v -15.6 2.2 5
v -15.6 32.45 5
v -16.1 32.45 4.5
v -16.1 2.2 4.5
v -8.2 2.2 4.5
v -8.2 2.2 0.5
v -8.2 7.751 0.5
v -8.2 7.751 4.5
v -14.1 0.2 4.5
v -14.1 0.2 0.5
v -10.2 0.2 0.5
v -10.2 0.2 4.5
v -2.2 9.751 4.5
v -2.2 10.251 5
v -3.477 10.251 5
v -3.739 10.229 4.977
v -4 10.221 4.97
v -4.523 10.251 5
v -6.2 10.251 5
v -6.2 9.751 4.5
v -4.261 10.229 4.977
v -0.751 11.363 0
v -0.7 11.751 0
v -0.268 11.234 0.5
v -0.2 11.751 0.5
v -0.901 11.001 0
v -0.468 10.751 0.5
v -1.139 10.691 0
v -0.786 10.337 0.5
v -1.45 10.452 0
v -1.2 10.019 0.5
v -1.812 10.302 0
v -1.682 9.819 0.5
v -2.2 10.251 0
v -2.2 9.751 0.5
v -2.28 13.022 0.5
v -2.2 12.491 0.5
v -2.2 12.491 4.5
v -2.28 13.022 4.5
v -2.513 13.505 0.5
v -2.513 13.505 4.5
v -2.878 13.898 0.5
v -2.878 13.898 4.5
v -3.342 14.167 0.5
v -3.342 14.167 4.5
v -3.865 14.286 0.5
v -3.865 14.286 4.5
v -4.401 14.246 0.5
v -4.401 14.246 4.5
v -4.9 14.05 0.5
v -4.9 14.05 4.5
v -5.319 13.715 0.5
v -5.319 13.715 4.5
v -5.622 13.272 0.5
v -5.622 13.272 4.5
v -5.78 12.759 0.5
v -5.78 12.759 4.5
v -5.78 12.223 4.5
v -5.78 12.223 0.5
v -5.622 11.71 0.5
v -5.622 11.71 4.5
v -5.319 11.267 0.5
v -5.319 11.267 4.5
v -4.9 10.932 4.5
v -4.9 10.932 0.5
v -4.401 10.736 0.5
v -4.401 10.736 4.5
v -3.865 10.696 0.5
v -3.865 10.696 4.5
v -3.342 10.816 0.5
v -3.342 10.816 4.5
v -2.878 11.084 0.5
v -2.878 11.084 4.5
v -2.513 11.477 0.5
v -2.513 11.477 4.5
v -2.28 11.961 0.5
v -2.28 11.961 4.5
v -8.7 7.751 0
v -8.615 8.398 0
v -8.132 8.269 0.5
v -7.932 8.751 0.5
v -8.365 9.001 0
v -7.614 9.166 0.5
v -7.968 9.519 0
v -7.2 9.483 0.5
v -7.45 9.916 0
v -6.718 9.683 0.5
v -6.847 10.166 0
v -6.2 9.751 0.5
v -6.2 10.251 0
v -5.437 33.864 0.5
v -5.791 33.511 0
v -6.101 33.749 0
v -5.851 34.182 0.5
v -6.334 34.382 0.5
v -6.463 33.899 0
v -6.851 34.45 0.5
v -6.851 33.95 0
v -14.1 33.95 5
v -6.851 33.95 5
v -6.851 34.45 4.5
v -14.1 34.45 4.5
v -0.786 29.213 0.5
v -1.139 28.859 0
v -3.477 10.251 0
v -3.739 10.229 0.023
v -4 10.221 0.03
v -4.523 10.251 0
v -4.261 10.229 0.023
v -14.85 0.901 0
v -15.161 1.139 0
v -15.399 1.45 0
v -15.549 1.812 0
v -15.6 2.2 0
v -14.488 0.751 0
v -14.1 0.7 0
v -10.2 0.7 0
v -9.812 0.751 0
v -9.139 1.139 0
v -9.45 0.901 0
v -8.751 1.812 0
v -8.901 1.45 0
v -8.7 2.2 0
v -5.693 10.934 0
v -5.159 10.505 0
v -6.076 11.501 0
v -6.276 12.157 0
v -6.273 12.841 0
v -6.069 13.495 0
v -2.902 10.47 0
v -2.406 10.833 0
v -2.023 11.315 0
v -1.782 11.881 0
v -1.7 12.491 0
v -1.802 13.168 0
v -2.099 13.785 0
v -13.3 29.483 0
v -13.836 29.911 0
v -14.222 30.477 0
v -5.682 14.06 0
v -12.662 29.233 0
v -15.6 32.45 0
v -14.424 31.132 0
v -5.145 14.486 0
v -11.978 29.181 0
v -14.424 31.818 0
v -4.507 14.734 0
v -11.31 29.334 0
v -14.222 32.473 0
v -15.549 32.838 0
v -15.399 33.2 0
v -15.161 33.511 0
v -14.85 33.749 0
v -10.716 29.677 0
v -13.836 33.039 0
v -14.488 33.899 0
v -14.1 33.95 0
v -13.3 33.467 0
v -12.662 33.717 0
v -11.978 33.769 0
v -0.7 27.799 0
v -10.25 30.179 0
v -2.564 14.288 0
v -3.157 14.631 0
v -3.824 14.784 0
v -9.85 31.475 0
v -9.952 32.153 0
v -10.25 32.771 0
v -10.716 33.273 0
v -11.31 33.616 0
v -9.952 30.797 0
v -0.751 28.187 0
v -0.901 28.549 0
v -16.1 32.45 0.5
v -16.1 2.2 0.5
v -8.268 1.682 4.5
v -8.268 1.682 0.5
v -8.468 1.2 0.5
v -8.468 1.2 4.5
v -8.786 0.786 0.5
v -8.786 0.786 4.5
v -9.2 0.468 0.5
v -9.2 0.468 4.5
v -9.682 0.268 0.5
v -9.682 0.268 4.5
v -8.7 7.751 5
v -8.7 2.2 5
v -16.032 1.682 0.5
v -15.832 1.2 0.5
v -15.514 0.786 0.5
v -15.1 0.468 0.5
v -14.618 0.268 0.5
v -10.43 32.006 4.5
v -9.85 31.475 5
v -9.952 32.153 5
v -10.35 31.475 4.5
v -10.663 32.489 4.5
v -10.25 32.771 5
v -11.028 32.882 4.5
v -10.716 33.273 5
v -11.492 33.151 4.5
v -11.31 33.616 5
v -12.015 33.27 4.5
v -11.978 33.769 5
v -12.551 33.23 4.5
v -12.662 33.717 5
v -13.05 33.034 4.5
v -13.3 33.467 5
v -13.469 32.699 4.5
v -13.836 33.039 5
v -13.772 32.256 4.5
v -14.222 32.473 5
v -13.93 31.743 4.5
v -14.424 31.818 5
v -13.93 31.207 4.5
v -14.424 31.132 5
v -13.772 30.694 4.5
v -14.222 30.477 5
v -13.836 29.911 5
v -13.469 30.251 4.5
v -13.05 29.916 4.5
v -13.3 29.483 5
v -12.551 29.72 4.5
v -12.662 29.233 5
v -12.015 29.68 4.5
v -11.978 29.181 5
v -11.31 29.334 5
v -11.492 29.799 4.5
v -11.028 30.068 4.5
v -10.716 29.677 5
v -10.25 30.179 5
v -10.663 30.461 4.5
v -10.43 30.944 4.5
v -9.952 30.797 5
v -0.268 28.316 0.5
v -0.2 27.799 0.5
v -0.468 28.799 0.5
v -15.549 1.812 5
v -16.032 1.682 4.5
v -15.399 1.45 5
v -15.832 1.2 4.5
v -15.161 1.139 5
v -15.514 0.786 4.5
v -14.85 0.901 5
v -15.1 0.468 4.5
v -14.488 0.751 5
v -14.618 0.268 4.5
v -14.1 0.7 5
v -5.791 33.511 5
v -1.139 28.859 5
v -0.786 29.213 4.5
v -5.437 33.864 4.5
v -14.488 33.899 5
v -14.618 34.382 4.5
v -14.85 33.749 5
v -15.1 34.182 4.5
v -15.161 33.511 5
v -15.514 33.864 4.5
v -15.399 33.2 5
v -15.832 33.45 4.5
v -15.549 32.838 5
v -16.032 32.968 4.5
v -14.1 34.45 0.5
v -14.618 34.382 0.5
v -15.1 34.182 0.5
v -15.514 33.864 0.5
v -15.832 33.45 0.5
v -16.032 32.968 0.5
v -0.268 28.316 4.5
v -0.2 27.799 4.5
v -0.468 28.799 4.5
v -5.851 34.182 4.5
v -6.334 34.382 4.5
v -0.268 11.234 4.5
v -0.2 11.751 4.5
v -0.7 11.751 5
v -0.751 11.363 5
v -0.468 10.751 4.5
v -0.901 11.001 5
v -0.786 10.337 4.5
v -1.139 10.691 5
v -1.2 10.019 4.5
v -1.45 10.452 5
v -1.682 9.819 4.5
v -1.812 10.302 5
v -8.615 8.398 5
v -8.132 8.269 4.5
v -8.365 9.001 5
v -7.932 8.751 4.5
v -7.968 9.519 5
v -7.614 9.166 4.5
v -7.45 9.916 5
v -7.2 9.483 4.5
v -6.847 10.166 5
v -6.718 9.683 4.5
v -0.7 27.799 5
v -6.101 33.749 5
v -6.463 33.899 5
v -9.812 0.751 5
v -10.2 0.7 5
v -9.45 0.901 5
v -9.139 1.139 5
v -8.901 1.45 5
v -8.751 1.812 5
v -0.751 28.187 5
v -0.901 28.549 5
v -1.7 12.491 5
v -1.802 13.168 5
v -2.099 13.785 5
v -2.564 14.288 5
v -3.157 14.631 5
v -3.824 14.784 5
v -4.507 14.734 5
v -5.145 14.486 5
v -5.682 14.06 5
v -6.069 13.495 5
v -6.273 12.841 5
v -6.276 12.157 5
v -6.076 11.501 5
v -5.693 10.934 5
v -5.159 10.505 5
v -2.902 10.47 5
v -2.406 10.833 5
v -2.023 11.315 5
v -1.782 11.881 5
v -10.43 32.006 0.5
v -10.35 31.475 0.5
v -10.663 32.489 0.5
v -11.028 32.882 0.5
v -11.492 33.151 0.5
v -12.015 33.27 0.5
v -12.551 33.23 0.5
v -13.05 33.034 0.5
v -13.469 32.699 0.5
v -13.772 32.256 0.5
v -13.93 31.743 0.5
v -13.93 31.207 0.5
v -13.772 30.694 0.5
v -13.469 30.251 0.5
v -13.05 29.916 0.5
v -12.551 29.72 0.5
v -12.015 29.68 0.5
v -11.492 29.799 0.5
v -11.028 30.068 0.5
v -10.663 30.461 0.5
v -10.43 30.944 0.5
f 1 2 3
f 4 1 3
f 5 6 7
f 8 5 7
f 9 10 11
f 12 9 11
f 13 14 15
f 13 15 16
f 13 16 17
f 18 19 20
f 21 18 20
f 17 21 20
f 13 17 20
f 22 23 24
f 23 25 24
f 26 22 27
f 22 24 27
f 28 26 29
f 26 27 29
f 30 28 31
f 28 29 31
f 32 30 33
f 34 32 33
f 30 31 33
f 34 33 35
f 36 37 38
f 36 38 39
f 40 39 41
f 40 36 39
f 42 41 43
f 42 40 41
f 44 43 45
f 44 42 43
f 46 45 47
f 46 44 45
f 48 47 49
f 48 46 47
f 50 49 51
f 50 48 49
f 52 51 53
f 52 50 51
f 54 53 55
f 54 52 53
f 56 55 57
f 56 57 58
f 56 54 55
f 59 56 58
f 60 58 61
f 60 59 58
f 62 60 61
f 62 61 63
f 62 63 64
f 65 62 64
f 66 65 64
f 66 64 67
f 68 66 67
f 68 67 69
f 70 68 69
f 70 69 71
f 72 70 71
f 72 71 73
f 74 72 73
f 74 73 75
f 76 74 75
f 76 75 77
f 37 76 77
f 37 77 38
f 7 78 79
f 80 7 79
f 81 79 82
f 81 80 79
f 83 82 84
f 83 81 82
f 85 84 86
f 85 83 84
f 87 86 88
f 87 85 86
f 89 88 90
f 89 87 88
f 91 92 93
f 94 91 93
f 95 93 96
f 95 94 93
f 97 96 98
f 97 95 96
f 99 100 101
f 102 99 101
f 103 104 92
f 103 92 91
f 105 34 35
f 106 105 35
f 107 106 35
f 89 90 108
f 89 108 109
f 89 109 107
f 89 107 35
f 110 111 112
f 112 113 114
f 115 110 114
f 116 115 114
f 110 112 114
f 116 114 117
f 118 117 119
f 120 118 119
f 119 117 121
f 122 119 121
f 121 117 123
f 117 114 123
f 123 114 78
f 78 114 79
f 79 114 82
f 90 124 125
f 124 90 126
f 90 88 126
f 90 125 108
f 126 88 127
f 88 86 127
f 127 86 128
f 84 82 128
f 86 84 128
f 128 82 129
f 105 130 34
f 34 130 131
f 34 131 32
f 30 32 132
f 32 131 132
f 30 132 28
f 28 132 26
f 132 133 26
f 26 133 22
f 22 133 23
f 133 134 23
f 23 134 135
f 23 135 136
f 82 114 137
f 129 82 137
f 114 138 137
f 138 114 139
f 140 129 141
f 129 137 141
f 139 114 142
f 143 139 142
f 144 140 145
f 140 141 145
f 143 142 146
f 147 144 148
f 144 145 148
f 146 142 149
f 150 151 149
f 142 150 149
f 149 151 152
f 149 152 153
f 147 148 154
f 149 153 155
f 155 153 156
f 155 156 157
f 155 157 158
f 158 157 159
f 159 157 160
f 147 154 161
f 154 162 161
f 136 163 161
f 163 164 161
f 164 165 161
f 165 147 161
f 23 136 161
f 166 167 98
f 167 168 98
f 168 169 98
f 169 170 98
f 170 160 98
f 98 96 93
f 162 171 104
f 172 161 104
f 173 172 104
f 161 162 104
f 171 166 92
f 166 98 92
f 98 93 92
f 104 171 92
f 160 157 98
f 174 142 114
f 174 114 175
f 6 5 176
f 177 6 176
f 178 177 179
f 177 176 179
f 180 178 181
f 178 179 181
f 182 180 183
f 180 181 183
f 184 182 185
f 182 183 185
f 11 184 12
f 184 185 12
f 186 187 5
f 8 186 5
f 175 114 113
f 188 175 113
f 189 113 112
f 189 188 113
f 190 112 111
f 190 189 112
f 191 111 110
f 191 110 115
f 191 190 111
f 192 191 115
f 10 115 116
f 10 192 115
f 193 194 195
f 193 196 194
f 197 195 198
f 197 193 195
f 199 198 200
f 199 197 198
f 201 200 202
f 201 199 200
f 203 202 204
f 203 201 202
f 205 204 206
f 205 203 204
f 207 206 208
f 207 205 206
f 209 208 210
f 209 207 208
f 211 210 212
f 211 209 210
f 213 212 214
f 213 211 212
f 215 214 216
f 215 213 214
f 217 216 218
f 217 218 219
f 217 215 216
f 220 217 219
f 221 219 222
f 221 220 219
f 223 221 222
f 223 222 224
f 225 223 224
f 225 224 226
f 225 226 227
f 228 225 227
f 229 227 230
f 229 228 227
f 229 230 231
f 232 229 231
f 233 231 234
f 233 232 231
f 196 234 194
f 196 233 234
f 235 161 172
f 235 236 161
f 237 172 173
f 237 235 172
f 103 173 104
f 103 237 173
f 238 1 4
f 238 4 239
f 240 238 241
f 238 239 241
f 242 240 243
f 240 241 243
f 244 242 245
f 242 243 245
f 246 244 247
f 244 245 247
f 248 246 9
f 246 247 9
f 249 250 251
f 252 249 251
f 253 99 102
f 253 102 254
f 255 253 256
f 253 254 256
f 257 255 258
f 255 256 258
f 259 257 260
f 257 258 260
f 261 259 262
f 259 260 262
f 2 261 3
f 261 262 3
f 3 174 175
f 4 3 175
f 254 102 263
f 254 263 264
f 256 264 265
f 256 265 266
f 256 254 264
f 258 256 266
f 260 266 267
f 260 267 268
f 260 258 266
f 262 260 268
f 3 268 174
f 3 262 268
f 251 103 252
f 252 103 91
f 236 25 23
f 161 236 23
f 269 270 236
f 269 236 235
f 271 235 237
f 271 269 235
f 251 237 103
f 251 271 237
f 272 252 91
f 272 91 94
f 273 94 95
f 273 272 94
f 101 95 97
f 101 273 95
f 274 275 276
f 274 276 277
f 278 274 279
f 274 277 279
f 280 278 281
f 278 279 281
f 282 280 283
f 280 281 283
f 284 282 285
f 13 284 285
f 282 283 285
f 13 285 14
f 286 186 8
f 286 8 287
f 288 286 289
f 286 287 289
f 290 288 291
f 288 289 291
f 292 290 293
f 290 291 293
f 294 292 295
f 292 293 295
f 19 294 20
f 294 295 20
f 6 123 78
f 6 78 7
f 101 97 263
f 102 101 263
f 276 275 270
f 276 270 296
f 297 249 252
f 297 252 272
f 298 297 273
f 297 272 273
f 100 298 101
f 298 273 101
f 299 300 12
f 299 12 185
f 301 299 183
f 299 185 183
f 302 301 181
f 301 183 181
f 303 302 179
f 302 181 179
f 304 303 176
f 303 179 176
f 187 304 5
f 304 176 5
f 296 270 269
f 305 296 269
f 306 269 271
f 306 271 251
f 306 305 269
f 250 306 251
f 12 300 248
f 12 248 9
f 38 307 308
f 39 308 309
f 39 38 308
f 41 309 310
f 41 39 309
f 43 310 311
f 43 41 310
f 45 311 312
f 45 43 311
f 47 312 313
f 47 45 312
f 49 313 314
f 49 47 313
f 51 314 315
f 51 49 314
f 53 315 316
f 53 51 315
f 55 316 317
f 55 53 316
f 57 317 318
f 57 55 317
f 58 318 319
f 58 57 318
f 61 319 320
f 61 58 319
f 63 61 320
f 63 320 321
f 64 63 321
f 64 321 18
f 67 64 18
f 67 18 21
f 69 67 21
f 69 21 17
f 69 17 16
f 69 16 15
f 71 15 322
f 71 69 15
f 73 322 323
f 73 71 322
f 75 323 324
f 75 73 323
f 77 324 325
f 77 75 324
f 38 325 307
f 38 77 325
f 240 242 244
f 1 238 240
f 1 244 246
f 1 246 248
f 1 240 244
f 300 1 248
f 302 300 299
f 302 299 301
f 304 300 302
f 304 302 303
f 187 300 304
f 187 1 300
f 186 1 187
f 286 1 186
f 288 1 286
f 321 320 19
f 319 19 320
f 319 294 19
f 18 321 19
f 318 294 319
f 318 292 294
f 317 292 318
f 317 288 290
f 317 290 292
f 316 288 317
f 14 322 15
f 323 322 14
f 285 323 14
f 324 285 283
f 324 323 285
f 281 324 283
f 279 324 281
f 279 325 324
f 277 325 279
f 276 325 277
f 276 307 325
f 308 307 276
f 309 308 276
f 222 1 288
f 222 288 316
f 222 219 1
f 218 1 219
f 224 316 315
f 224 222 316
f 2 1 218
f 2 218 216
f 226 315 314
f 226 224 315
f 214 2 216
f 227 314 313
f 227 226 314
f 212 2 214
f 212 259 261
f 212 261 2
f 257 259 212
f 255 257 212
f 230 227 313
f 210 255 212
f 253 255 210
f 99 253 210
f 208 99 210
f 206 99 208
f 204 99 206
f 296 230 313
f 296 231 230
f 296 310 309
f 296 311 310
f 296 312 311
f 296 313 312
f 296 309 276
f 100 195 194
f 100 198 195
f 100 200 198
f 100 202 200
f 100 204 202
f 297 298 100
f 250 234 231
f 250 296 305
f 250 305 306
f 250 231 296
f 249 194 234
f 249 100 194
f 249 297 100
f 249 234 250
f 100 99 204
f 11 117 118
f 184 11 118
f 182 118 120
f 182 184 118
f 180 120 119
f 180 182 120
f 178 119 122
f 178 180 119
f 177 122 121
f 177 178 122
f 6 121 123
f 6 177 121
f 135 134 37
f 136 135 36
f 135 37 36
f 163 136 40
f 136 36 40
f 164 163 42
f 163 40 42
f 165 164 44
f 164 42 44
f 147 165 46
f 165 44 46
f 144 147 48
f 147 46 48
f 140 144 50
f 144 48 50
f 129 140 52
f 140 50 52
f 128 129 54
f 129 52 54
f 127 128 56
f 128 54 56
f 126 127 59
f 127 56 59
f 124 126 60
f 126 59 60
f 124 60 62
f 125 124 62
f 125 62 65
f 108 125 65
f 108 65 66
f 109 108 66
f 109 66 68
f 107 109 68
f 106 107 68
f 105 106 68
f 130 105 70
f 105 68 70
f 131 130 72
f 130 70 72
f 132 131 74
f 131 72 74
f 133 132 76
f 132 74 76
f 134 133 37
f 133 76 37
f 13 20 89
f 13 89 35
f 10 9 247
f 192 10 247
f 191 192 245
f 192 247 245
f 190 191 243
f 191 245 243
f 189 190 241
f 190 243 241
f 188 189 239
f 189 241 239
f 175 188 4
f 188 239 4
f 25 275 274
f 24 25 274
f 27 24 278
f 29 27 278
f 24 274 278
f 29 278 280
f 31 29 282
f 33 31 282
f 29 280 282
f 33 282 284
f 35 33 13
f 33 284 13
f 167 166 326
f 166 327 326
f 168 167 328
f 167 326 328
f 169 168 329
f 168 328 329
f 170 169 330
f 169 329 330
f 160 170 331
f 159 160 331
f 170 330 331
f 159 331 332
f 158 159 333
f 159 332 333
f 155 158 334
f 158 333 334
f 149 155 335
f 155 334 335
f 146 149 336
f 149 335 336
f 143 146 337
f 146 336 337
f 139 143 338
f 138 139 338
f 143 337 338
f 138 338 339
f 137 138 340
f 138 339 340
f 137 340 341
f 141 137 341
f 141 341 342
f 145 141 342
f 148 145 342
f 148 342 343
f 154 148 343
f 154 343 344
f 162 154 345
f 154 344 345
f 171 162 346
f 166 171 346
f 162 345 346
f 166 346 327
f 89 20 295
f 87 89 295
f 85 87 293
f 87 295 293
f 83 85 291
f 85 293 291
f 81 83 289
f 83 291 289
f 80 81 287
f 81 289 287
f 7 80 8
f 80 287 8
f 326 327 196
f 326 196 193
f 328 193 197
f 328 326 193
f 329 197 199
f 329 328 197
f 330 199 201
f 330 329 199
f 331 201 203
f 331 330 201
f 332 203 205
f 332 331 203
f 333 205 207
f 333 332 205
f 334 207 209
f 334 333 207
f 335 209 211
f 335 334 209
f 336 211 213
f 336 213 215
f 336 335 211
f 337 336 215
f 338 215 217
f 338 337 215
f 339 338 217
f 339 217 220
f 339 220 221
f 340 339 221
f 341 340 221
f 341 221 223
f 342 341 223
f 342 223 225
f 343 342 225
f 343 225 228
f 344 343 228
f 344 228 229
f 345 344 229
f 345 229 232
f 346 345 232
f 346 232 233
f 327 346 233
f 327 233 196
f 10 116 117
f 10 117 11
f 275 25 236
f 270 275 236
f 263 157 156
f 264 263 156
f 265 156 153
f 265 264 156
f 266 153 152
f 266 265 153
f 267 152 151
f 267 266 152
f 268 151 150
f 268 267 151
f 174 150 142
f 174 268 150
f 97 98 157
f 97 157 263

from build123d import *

# Parameters (mm, degrees)
SKIZZE1_R                       = 1.8
AUFSATZ_LINEAR_AUSTRAGEN1_DEPTH = 5
VERRUNDUNG1_R                   = 2
FASE1_SIZE                      = 0.5


with BuildPart() as part:
    # Skizze1 → Aufsatz-Linear austragen1 (new body)
    with BuildSketch(Plane.XY):
        Polygon((-0.2, 9.751346921), (-0.2, 28.627239348), (-6.022760652, 34.45), (-16.1, 34.45), (-16.1, 0.2), (-8.2, 0.2), (-8.2, 9.751346921), align=None)
        with Locations((-12.15, 31.475)):
            Circle(SKIZZE1_R, mode=Mode.SUBTRACT)
        with Locations((-4, 12.49111782)):
            Circle(SKIZZE1_R, mode=Mode.SUBTRACT)
    extrude(amount=AUFSATZ_LINEAR_AUSTRAGEN1_DEPTH)

    # Verrundung1
    verrundung1_edges = [part.edges().sort_by_distance(p)[0] for p in [
        (-8.2, 9.751346921, 2.5),
        (-8.2, 0.2, 2.5),
        (-16.1, 0.2, 2.5),
        (-16.1, 34.45, 2.5),
        (-6.022760652, 34.45, 2.5),
        (-0.2, 28.627239348, 2.5),
        (-0.2, 9.751346921, 2.5),
    ]]
    fillet(verrundung1_edges, radius=VERRUNDUNG1_R)

    # Fase1
    # the kernel refuses this chamfer: 0.5 mm, written as the material it takes off along each edge
    with BuildSketch(Plane(origin=(-12.15, 31.475, 0), x_dir=(1, 0, 0), z_dir=(0, -1, 0))) as fase1_piece_1:
        Polygon((1.8 + FASE1_SIZE, 0), (1.8, FASE1_SIZE), (1.8, 0), align=None)
    revolve(axis=Axis((-12.15, 31.475, 0), (0, 0, 1)), mode=Mode.SUBTRACT)
    with BuildSketch(Plane(origin=(-12.15, 31.475, 5), x_dir=(1, 0, 0), z_dir=(0, -1, 0))) as fase1_piece_2:
        Polygon((1.8 + FASE1_SIZE, 0), (1.8, -FASE1_SIZE), (1.8, 0), align=None)
    revolve(axis=Axis((-12.15, 31.475, 5), (0, 0, 1)), mode=Mode.SUBTRACT)
    with BuildSketch(Plane(origin=(-4, 12.49111782, 0), x_dir=(1, 0, 0), z_dir=(0, -1, 0))) as fase1_piece_3:
        Polygon((1.8 + FASE1_SIZE, 0), (1.8, FASE1_SIZE), (1.8, 0), align=None)
    revolve(axis=Axis((-4, 12.49111782, 0), (0, 0, 1)), mode=Mode.SUBTRACT)
    with BuildSketch(Plane(origin=(-4, 12.49111782, 5), x_dir=(1, 0, 0), z_dir=(0, -1, 0))) as fase1_piece_4:
        Polygon((1.8 + FASE1_SIZE, 0), (1.8, -FASE1_SIZE), (1.8, 0), align=None)
    revolve(axis=Axis((-4, 12.49111782, 5), (0, 0, 1)), mode=Mode.SUBTRACT)
    with BuildSketch(Plane(origin=(-0.2, 11.751346921, 0), x_dir=(0.027495876610586382, 0, 0.9996219169112968), z_dir=(0, 1, 0))) as fase1_piece_5:
        Polygon((FASE1_SIZE * 0.999621916911, -FASE1_SIZE * 0.0274958766106), (-FASE1_SIZE * 0.0274958766106, -FASE1_SIZE * 0.999621916911), (0, 0), align=None)
    extrude(amount=16.047465302, mode=Mode.SUBTRACT)
    with BuildSketch(Plane(origin=(-0.2, 11.751346921, 5), x_dir=(0.027495876610586403, 0, -0.9996219169112968), z_dir=(0, 1, 0))) as fase1_piece_6:
        Polygon((FASE1_SIZE * 0.999621916911, FASE1_SIZE * 0.0274958766106), (-FASE1_SIZE * 0.0274958766106, FASE1_SIZE * 0.999621916911), (0, 0), align=None)
    extrude(amount=16.047465302, mode=Mode.SUBTRACT)
    with BuildSketch(Plane(origin=(-6.2, 9.751346921, 0), x_dir=(0, 0.9996219169112968, -0.02749587661058639), z_dir=(1, 0, 0))) as fase1_piece_7:
        Polygon((FASE1_SIZE * 0.999621916911, FASE1_SIZE * 0.0274958766106), (-FASE1_SIZE * 0.0274958766106, FASE1_SIZE * 0.999621916911), (0, 0), align=None)
    extrude(amount=4, mode=Mode.SUBTRACT)
    with BuildSketch(Plane(origin=(-8.2, 2.2, 0), x_dir=(-0.9996219169112968, 0, -0.02749587661058639), z_dir=(0, 1, 0))) as fase1_piece_8:
        Polygon((FASE1_SIZE * 0.999621916911, FASE1_SIZE * 0.0274958766106), (-FASE1_SIZE * 0.0274958766106, FASE1_SIZE * 0.999621916911), (0, 0), align=None)
    extrude(amount=5.551346921, mode=Mode.SUBTRACT)
    with BuildSketch(Plane(origin=(-14.1, 0.2, 0), x_dir=(0, 0.9996219169112968, -0.027495876610586372), z_dir=(1, 0, 0))) as fase1_piece_9:
        Polygon((FASE1_SIZE * 0.999621916911, FASE1_SIZE * 0.0274958766106), (-FASE1_SIZE * 0.0274958766106, FASE1_SIZE * 0.999621916911), (0, 0), align=None)
    extrude(amount=3.9, mode=Mode.SUBTRACT)
    with BuildSketch(Plane(origin=(-16.1, 32.45, 0), x_dir=(0.9996219169112968, 0, -0.02749587661058639), z_dir=(0, -1, 0))) as fase1_piece_10:
        Polygon((FASE1_SIZE * 0.999621916911, FASE1_SIZE * 0.0274958766106), (-FASE1_SIZE * 0.0274958766106, FASE1_SIZE * 0.999621916911), (0, 0), align=None)
    extrude(amount=30.25, mode=Mode.SUBTRACT)
    with BuildSketch(Plane(origin=(-6.851187777, 34.45, 0), x_dir=(0, -0.9996219169112968, -0.027495876610586483), z_dir=(-1, 0, 0))) as fase1_piece_11:
        Polygon((FASE1_SIZE * 0.999621916911, FASE1_SIZE * 0.0274958766106), (-FASE1_SIZE * 0.0274958766106, FASE1_SIZE * 0.999621916911), (0, 0), align=None)
    extrude(amount=7.248812223, mode=Mode.SUBTRACT)
    with BuildSketch(Plane(origin=(-0.785786438, 29.213025785, 0), x_dir=(-0.7068394360706736, -0.7068394360706733, -0.027495876610586348), z_dir=(-0.7071067811865475, 0.7071067811865477, 0))) as fase1_piece_12:
        Polygon((FASE1_SIZE * 0.999621916911, FASE1_SIZE * 0.0274958766106), (-FASE1_SIZE * 0.0274958766106, FASE1_SIZE * 0.999621916911), (0, 0), align=None)
    extrude(amount=6.577772835, mode=Mode.SUBTRACT)
    with BuildSketch(Plane(origin=(-2.2, 27.798812223, 0), x_dir=(1, 0, 0), z_dir=(0, -1, 0))) as fase1_piece_13:
        Polygon((2 - FASE1_SIZE, 0), (2, FASE1_SIZE), (2, 0), align=None)
    revolve(axis=Axis((-2.2, 27.798812223, 0), (0, 0, 1)), revolution_arc=45, mode=Mode.SUBTRACT)
    with BuildSketch(Plane(origin=(-6.851187777, 32.45, 0), x_dir=(0.7071067811865487, 0.7071067811865465, 0), z_dir=(0.7071067811865465, -0.7071067811865487, 0))) as fase1_piece_14:
        Polygon((2 - FASE1_SIZE, 0), (2, FASE1_SIZE), (2, 0), align=None)
    revolve(axis=Axis((-6.851187777, 32.45, 0), (0, 0, 1)), revolution_arc=45, mode=Mode.SUBTRACT)
    with BuildSketch(Plane(origin=(-14.1, 32.45, 0), x_dir=(0, 1, 0), z_dir=(1, 0, 0))) as fase1_piece_15:
        Polygon((2 - FASE1_SIZE, 0), (2, FASE1_SIZE), (2, 0), align=None)
    revolve(axis=Axis((-14.1, 32.45, 0), (0, 0, 1)), revolution_arc=90, mode=Mode.SUBTRACT)
    with BuildSketch(Plane(origin=(-14.1, 2.2, 0), x_dir=(-1, 0, 0), z_dir=(0, 1, 0))) as fase1_piece_16:
        Polygon((2 - FASE1_SIZE, 0), (2, FASE1_SIZE), (2, 0), align=None)
    revolve(axis=Axis((-14.1, 2.2, 0), (0, 0, 1)), revolution_arc=90, mode=Mode.SUBTRACT)
    with BuildSketch(Plane(origin=(-10.2, 2.2, 0), x_dir=(0, -1, 0), z_dir=(-1, 0, 0))) as fase1_piece_17:
        Polygon((2 - FASE1_SIZE, 0), (2, FASE1_SIZE), (2, 0), align=None)
    revolve(axis=Axis((-10.2, 2.2, 0), (0, 0, 1)), revolution_arc=90, mode=Mode.SUBTRACT)
    with BuildSketch(Plane(origin=(-2.2, 11.751346921, 0), x_dir=(1, 0, 0), z_dir=(0, 1, 0))) as fase1_piece_18:
        Polygon((2 - FASE1_SIZE, 0), (2, -FASE1_SIZE), (2, 0), align=None)
    revolve(axis=Axis((-2.2, 11.751346921, 0), (0, 0, -1)), revolution_arc=90, mode=Mode.SUBTRACT)
    with BuildSketch(Plane(origin=(-6.2, 9.751346921, 5), x_dir=(0, 0.9996219169112968, 0.027495876610585647), z_dir=(1, 0, 0))) as fase1_piece_19:
        Polygon((FASE1_SIZE * 0.999621916911, -FASE1_SIZE * 0.0274958766106), (-FASE1_SIZE * 0.0274958766106, -FASE1_SIZE * 0.999621916911), (0, 0), align=None)
    extrude(amount=4, mode=Mode.SUBTRACT)
    with BuildSketch(Plane(origin=(-0.785786438, 29.213025785, 5), x_dir=(-0.7068394360706736, -0.7068394360706733, 0.027495876610585605), z_dir=(-0.7071067811865475, 0.7071067811865477, 0))) as fase1_piece_20:
        Polygon((FASE1_SIZE * 0.999621916911, -FASE1_SIZE * 0.0274958766106), (-FASE1_SIZE * 0.0274958766106, -FASE1_SIZE * 0.999621916911), (0, 0), align=None)
    extrude(amount=6.577772835, mode=Mode.SUBTRACT)
    with BuildSketch(Plane(origin=(-6.851187777, 34.45, 5), x_dir=(0, -0.9996219169112968, 0.02749587661058574), z_dir=(-1, 0, 0))) as fase1_piece_21:
        Polygon((FASE1_SIZE * 0.999621916911, -FASE1_SIZE * 0.0274958766106), (-FASE1_SIZE * 0.0274958766106, -FASE1_SIZE * 0.999621916911), (0, 0), align=None)
    extrude(amount=7.248812223, mode=Mode.SUBTRACT)
    with BuildSketch(Plane(origin=(-16.1, 32.45, 5), x_dir=(0.9996219169112968, 0, 0.027495876610585647), z_dir=(0, -1, 0))) as fase1_piece_22:
        Polygon((FASE1_SIZE * 0.999621916911, -FASE1_SIZE * 0.0274958766106), (-FASE1_SIZE * 0.0274958766106, -FASE1_SIZE * 0.999621916911), (0, 0), align=None)
    extrude(amount=30.25, mode=Mode.SUBTRACT)
    with BuildSketch(Plane(origin=(-14.1, 0.2, 5), x_dir=(0, 0.9996219169112968, 0.02749587661058563), z_dir=(1, 0, 0))) as fase1_piece_23:
        Polygon((FASE1_SIZE * 0.999621916911, -FASE1_SIZE * 0.0274958766106), (-FASE1_SIZE * 0.0274958766106, -FASE1_SIZE * 0.999621916911), (0, 0), align=None)
    extrude(amount=3.9, mode=Mode.SUBTRACT)
    with BuildSketch(Plane(origin=(-8.2, 2.2, 5), x_dir=(-0.9996219169112968, 0, 0.027495876610585647), z_dir=(0, 1, 0))) as fase1_piece_24:
        Polygon((FASE1_SIZE * 0.999621916911, -FASE1_SIZE * 0.0274958766106), (-FASE1_SIZE * 0.0274958766106, -FASE1_SIZE * 0.999621916911), (0, 0), align=None)
    extrude(amount=5.551346921, mode=Mode.SUBTRACT)
    with BuildSketch(Plane(origin=(-2.2, 27.798812223, 5), x_dir=(1, 0, 0), z_dir=(0, -1, 0))) as fase1_piece_25:
        Polygon((2, -FASE1_SIZE), (2 - FASE1_SIZE, 0), (2, 0), align=None)
    revolve(axis=Axis((-2.2, 27.798812223, 5), (0, 0, 1)), revolution_arc=45, mode=Mode.SUBTRACT)
    with BuildSketch(Plane(origin=(-6.851187777, 32.45, 5), x_dir=(0.7071067811865487, 0.7071067811865465, 0), z_dir=(0.7071067811865465, -0.7071067811865487, 0))) as fase1_piece_26:
        Polygon((2 - FASE1_SIZE, 0), (2, -FASE1_SIZE), (2, 0), align=None)
    revolve(axis=Axis((-6.851187777, 32.45, 5), (0, 0, 1)), revolution_arc=45, mode=Mode.SUBTRACT)
    with BuildSketch(Plane(origin=(-14.1, 32.45, 5), x_dir=(0, 1, 0), z_dir=(1, 0, 0))) as fase1_piece_27:
        Polygon((2 - FASE1_SIZE, 0), (2, -FASE1_SIZE), (2, 0), align=None)
    revolve(axis=Axis((-14.1, 32.45, 5), (0, 0, 1)), revolution_arc=90, mode=Mode.SUBTRACT)
    with BuildSketch(Plane(origin=(-14.1, 2.2, 5), x_dir=(-1, 0, 0), z_dir=(0, 1, 0))) as fase1_piece_28:
        Polygon((2 - FASE1_SIZE, 0), (2, -FASE1_SIZE), (2, 0), align=None)
    revolve(axis=Axis((-14.1, 2.2, 5), (0, 0, 1)), revolution_arc=90, mode=Mode.SUBTRACT)
    with BuildSketch(Plane(origin=(-10.2, 2.2, 5), x_dir=(0, -1, 0), z_dir=(-1, 0, 0))) as fase1_piece_29:
        Polygon((2 - FASE1_SIZE, 0), (2, -FASE1_SIZE), (2, 0), align=None)
    revolve(axis=Axis((-10.2, 2.2, 5), (0, 0, 1)), revolution_arc=90, mode=Mode.SUBTRACT)
    with BuildSketch(Plane(origin=(-2.2, 11.751346921, 5), x_dir=(1, 0, 0), z_dir=(0, 1, 0))) as fase1_piece_30:
        Polygon((2, FASE1_SIZE), (2 - FASE1_SIZE, 0), (2, 0), align=None)
    revolve(axis=Axis((-2.2, 11.751346921, 5), (0, 0, -1)), revolution_arc=90, mode=Mode.SUBTRACT)
    with BuildSketch(Plane(origin=(-6.2, 7.751346921, 0), x_dir=(-1, 0, 0), z_dir=(0, -1, 0))) as fase1_piece_31:
        Polygon((2 + FASE1_SIZE, 0), (2, -FASE1_SIZE), (2, 0), align=None)
    revolve(axis=Axis((-6.2, 7.751346921, 0), (0, 0, -1)), revolution_arc=90, mode=Mode.SUBTRACT)
    with BuildSketch(Plane(origin=(-6.2, 7.751346921, 5), x_dir=(-1, 0, 0), z_dir=(0, -1, 0))) as fase1_piece_32:
        Polygon((2 + FASE1_SIZE, 0), (2, FASE1_SIZE), (2, 0), align=None)
    revolve(axis=Axis((-6.2, 7.751346921, 5), (0, 0, -1)), revolution_arc=90, mode=Mode.SUBTRACT)


solid = part.part
